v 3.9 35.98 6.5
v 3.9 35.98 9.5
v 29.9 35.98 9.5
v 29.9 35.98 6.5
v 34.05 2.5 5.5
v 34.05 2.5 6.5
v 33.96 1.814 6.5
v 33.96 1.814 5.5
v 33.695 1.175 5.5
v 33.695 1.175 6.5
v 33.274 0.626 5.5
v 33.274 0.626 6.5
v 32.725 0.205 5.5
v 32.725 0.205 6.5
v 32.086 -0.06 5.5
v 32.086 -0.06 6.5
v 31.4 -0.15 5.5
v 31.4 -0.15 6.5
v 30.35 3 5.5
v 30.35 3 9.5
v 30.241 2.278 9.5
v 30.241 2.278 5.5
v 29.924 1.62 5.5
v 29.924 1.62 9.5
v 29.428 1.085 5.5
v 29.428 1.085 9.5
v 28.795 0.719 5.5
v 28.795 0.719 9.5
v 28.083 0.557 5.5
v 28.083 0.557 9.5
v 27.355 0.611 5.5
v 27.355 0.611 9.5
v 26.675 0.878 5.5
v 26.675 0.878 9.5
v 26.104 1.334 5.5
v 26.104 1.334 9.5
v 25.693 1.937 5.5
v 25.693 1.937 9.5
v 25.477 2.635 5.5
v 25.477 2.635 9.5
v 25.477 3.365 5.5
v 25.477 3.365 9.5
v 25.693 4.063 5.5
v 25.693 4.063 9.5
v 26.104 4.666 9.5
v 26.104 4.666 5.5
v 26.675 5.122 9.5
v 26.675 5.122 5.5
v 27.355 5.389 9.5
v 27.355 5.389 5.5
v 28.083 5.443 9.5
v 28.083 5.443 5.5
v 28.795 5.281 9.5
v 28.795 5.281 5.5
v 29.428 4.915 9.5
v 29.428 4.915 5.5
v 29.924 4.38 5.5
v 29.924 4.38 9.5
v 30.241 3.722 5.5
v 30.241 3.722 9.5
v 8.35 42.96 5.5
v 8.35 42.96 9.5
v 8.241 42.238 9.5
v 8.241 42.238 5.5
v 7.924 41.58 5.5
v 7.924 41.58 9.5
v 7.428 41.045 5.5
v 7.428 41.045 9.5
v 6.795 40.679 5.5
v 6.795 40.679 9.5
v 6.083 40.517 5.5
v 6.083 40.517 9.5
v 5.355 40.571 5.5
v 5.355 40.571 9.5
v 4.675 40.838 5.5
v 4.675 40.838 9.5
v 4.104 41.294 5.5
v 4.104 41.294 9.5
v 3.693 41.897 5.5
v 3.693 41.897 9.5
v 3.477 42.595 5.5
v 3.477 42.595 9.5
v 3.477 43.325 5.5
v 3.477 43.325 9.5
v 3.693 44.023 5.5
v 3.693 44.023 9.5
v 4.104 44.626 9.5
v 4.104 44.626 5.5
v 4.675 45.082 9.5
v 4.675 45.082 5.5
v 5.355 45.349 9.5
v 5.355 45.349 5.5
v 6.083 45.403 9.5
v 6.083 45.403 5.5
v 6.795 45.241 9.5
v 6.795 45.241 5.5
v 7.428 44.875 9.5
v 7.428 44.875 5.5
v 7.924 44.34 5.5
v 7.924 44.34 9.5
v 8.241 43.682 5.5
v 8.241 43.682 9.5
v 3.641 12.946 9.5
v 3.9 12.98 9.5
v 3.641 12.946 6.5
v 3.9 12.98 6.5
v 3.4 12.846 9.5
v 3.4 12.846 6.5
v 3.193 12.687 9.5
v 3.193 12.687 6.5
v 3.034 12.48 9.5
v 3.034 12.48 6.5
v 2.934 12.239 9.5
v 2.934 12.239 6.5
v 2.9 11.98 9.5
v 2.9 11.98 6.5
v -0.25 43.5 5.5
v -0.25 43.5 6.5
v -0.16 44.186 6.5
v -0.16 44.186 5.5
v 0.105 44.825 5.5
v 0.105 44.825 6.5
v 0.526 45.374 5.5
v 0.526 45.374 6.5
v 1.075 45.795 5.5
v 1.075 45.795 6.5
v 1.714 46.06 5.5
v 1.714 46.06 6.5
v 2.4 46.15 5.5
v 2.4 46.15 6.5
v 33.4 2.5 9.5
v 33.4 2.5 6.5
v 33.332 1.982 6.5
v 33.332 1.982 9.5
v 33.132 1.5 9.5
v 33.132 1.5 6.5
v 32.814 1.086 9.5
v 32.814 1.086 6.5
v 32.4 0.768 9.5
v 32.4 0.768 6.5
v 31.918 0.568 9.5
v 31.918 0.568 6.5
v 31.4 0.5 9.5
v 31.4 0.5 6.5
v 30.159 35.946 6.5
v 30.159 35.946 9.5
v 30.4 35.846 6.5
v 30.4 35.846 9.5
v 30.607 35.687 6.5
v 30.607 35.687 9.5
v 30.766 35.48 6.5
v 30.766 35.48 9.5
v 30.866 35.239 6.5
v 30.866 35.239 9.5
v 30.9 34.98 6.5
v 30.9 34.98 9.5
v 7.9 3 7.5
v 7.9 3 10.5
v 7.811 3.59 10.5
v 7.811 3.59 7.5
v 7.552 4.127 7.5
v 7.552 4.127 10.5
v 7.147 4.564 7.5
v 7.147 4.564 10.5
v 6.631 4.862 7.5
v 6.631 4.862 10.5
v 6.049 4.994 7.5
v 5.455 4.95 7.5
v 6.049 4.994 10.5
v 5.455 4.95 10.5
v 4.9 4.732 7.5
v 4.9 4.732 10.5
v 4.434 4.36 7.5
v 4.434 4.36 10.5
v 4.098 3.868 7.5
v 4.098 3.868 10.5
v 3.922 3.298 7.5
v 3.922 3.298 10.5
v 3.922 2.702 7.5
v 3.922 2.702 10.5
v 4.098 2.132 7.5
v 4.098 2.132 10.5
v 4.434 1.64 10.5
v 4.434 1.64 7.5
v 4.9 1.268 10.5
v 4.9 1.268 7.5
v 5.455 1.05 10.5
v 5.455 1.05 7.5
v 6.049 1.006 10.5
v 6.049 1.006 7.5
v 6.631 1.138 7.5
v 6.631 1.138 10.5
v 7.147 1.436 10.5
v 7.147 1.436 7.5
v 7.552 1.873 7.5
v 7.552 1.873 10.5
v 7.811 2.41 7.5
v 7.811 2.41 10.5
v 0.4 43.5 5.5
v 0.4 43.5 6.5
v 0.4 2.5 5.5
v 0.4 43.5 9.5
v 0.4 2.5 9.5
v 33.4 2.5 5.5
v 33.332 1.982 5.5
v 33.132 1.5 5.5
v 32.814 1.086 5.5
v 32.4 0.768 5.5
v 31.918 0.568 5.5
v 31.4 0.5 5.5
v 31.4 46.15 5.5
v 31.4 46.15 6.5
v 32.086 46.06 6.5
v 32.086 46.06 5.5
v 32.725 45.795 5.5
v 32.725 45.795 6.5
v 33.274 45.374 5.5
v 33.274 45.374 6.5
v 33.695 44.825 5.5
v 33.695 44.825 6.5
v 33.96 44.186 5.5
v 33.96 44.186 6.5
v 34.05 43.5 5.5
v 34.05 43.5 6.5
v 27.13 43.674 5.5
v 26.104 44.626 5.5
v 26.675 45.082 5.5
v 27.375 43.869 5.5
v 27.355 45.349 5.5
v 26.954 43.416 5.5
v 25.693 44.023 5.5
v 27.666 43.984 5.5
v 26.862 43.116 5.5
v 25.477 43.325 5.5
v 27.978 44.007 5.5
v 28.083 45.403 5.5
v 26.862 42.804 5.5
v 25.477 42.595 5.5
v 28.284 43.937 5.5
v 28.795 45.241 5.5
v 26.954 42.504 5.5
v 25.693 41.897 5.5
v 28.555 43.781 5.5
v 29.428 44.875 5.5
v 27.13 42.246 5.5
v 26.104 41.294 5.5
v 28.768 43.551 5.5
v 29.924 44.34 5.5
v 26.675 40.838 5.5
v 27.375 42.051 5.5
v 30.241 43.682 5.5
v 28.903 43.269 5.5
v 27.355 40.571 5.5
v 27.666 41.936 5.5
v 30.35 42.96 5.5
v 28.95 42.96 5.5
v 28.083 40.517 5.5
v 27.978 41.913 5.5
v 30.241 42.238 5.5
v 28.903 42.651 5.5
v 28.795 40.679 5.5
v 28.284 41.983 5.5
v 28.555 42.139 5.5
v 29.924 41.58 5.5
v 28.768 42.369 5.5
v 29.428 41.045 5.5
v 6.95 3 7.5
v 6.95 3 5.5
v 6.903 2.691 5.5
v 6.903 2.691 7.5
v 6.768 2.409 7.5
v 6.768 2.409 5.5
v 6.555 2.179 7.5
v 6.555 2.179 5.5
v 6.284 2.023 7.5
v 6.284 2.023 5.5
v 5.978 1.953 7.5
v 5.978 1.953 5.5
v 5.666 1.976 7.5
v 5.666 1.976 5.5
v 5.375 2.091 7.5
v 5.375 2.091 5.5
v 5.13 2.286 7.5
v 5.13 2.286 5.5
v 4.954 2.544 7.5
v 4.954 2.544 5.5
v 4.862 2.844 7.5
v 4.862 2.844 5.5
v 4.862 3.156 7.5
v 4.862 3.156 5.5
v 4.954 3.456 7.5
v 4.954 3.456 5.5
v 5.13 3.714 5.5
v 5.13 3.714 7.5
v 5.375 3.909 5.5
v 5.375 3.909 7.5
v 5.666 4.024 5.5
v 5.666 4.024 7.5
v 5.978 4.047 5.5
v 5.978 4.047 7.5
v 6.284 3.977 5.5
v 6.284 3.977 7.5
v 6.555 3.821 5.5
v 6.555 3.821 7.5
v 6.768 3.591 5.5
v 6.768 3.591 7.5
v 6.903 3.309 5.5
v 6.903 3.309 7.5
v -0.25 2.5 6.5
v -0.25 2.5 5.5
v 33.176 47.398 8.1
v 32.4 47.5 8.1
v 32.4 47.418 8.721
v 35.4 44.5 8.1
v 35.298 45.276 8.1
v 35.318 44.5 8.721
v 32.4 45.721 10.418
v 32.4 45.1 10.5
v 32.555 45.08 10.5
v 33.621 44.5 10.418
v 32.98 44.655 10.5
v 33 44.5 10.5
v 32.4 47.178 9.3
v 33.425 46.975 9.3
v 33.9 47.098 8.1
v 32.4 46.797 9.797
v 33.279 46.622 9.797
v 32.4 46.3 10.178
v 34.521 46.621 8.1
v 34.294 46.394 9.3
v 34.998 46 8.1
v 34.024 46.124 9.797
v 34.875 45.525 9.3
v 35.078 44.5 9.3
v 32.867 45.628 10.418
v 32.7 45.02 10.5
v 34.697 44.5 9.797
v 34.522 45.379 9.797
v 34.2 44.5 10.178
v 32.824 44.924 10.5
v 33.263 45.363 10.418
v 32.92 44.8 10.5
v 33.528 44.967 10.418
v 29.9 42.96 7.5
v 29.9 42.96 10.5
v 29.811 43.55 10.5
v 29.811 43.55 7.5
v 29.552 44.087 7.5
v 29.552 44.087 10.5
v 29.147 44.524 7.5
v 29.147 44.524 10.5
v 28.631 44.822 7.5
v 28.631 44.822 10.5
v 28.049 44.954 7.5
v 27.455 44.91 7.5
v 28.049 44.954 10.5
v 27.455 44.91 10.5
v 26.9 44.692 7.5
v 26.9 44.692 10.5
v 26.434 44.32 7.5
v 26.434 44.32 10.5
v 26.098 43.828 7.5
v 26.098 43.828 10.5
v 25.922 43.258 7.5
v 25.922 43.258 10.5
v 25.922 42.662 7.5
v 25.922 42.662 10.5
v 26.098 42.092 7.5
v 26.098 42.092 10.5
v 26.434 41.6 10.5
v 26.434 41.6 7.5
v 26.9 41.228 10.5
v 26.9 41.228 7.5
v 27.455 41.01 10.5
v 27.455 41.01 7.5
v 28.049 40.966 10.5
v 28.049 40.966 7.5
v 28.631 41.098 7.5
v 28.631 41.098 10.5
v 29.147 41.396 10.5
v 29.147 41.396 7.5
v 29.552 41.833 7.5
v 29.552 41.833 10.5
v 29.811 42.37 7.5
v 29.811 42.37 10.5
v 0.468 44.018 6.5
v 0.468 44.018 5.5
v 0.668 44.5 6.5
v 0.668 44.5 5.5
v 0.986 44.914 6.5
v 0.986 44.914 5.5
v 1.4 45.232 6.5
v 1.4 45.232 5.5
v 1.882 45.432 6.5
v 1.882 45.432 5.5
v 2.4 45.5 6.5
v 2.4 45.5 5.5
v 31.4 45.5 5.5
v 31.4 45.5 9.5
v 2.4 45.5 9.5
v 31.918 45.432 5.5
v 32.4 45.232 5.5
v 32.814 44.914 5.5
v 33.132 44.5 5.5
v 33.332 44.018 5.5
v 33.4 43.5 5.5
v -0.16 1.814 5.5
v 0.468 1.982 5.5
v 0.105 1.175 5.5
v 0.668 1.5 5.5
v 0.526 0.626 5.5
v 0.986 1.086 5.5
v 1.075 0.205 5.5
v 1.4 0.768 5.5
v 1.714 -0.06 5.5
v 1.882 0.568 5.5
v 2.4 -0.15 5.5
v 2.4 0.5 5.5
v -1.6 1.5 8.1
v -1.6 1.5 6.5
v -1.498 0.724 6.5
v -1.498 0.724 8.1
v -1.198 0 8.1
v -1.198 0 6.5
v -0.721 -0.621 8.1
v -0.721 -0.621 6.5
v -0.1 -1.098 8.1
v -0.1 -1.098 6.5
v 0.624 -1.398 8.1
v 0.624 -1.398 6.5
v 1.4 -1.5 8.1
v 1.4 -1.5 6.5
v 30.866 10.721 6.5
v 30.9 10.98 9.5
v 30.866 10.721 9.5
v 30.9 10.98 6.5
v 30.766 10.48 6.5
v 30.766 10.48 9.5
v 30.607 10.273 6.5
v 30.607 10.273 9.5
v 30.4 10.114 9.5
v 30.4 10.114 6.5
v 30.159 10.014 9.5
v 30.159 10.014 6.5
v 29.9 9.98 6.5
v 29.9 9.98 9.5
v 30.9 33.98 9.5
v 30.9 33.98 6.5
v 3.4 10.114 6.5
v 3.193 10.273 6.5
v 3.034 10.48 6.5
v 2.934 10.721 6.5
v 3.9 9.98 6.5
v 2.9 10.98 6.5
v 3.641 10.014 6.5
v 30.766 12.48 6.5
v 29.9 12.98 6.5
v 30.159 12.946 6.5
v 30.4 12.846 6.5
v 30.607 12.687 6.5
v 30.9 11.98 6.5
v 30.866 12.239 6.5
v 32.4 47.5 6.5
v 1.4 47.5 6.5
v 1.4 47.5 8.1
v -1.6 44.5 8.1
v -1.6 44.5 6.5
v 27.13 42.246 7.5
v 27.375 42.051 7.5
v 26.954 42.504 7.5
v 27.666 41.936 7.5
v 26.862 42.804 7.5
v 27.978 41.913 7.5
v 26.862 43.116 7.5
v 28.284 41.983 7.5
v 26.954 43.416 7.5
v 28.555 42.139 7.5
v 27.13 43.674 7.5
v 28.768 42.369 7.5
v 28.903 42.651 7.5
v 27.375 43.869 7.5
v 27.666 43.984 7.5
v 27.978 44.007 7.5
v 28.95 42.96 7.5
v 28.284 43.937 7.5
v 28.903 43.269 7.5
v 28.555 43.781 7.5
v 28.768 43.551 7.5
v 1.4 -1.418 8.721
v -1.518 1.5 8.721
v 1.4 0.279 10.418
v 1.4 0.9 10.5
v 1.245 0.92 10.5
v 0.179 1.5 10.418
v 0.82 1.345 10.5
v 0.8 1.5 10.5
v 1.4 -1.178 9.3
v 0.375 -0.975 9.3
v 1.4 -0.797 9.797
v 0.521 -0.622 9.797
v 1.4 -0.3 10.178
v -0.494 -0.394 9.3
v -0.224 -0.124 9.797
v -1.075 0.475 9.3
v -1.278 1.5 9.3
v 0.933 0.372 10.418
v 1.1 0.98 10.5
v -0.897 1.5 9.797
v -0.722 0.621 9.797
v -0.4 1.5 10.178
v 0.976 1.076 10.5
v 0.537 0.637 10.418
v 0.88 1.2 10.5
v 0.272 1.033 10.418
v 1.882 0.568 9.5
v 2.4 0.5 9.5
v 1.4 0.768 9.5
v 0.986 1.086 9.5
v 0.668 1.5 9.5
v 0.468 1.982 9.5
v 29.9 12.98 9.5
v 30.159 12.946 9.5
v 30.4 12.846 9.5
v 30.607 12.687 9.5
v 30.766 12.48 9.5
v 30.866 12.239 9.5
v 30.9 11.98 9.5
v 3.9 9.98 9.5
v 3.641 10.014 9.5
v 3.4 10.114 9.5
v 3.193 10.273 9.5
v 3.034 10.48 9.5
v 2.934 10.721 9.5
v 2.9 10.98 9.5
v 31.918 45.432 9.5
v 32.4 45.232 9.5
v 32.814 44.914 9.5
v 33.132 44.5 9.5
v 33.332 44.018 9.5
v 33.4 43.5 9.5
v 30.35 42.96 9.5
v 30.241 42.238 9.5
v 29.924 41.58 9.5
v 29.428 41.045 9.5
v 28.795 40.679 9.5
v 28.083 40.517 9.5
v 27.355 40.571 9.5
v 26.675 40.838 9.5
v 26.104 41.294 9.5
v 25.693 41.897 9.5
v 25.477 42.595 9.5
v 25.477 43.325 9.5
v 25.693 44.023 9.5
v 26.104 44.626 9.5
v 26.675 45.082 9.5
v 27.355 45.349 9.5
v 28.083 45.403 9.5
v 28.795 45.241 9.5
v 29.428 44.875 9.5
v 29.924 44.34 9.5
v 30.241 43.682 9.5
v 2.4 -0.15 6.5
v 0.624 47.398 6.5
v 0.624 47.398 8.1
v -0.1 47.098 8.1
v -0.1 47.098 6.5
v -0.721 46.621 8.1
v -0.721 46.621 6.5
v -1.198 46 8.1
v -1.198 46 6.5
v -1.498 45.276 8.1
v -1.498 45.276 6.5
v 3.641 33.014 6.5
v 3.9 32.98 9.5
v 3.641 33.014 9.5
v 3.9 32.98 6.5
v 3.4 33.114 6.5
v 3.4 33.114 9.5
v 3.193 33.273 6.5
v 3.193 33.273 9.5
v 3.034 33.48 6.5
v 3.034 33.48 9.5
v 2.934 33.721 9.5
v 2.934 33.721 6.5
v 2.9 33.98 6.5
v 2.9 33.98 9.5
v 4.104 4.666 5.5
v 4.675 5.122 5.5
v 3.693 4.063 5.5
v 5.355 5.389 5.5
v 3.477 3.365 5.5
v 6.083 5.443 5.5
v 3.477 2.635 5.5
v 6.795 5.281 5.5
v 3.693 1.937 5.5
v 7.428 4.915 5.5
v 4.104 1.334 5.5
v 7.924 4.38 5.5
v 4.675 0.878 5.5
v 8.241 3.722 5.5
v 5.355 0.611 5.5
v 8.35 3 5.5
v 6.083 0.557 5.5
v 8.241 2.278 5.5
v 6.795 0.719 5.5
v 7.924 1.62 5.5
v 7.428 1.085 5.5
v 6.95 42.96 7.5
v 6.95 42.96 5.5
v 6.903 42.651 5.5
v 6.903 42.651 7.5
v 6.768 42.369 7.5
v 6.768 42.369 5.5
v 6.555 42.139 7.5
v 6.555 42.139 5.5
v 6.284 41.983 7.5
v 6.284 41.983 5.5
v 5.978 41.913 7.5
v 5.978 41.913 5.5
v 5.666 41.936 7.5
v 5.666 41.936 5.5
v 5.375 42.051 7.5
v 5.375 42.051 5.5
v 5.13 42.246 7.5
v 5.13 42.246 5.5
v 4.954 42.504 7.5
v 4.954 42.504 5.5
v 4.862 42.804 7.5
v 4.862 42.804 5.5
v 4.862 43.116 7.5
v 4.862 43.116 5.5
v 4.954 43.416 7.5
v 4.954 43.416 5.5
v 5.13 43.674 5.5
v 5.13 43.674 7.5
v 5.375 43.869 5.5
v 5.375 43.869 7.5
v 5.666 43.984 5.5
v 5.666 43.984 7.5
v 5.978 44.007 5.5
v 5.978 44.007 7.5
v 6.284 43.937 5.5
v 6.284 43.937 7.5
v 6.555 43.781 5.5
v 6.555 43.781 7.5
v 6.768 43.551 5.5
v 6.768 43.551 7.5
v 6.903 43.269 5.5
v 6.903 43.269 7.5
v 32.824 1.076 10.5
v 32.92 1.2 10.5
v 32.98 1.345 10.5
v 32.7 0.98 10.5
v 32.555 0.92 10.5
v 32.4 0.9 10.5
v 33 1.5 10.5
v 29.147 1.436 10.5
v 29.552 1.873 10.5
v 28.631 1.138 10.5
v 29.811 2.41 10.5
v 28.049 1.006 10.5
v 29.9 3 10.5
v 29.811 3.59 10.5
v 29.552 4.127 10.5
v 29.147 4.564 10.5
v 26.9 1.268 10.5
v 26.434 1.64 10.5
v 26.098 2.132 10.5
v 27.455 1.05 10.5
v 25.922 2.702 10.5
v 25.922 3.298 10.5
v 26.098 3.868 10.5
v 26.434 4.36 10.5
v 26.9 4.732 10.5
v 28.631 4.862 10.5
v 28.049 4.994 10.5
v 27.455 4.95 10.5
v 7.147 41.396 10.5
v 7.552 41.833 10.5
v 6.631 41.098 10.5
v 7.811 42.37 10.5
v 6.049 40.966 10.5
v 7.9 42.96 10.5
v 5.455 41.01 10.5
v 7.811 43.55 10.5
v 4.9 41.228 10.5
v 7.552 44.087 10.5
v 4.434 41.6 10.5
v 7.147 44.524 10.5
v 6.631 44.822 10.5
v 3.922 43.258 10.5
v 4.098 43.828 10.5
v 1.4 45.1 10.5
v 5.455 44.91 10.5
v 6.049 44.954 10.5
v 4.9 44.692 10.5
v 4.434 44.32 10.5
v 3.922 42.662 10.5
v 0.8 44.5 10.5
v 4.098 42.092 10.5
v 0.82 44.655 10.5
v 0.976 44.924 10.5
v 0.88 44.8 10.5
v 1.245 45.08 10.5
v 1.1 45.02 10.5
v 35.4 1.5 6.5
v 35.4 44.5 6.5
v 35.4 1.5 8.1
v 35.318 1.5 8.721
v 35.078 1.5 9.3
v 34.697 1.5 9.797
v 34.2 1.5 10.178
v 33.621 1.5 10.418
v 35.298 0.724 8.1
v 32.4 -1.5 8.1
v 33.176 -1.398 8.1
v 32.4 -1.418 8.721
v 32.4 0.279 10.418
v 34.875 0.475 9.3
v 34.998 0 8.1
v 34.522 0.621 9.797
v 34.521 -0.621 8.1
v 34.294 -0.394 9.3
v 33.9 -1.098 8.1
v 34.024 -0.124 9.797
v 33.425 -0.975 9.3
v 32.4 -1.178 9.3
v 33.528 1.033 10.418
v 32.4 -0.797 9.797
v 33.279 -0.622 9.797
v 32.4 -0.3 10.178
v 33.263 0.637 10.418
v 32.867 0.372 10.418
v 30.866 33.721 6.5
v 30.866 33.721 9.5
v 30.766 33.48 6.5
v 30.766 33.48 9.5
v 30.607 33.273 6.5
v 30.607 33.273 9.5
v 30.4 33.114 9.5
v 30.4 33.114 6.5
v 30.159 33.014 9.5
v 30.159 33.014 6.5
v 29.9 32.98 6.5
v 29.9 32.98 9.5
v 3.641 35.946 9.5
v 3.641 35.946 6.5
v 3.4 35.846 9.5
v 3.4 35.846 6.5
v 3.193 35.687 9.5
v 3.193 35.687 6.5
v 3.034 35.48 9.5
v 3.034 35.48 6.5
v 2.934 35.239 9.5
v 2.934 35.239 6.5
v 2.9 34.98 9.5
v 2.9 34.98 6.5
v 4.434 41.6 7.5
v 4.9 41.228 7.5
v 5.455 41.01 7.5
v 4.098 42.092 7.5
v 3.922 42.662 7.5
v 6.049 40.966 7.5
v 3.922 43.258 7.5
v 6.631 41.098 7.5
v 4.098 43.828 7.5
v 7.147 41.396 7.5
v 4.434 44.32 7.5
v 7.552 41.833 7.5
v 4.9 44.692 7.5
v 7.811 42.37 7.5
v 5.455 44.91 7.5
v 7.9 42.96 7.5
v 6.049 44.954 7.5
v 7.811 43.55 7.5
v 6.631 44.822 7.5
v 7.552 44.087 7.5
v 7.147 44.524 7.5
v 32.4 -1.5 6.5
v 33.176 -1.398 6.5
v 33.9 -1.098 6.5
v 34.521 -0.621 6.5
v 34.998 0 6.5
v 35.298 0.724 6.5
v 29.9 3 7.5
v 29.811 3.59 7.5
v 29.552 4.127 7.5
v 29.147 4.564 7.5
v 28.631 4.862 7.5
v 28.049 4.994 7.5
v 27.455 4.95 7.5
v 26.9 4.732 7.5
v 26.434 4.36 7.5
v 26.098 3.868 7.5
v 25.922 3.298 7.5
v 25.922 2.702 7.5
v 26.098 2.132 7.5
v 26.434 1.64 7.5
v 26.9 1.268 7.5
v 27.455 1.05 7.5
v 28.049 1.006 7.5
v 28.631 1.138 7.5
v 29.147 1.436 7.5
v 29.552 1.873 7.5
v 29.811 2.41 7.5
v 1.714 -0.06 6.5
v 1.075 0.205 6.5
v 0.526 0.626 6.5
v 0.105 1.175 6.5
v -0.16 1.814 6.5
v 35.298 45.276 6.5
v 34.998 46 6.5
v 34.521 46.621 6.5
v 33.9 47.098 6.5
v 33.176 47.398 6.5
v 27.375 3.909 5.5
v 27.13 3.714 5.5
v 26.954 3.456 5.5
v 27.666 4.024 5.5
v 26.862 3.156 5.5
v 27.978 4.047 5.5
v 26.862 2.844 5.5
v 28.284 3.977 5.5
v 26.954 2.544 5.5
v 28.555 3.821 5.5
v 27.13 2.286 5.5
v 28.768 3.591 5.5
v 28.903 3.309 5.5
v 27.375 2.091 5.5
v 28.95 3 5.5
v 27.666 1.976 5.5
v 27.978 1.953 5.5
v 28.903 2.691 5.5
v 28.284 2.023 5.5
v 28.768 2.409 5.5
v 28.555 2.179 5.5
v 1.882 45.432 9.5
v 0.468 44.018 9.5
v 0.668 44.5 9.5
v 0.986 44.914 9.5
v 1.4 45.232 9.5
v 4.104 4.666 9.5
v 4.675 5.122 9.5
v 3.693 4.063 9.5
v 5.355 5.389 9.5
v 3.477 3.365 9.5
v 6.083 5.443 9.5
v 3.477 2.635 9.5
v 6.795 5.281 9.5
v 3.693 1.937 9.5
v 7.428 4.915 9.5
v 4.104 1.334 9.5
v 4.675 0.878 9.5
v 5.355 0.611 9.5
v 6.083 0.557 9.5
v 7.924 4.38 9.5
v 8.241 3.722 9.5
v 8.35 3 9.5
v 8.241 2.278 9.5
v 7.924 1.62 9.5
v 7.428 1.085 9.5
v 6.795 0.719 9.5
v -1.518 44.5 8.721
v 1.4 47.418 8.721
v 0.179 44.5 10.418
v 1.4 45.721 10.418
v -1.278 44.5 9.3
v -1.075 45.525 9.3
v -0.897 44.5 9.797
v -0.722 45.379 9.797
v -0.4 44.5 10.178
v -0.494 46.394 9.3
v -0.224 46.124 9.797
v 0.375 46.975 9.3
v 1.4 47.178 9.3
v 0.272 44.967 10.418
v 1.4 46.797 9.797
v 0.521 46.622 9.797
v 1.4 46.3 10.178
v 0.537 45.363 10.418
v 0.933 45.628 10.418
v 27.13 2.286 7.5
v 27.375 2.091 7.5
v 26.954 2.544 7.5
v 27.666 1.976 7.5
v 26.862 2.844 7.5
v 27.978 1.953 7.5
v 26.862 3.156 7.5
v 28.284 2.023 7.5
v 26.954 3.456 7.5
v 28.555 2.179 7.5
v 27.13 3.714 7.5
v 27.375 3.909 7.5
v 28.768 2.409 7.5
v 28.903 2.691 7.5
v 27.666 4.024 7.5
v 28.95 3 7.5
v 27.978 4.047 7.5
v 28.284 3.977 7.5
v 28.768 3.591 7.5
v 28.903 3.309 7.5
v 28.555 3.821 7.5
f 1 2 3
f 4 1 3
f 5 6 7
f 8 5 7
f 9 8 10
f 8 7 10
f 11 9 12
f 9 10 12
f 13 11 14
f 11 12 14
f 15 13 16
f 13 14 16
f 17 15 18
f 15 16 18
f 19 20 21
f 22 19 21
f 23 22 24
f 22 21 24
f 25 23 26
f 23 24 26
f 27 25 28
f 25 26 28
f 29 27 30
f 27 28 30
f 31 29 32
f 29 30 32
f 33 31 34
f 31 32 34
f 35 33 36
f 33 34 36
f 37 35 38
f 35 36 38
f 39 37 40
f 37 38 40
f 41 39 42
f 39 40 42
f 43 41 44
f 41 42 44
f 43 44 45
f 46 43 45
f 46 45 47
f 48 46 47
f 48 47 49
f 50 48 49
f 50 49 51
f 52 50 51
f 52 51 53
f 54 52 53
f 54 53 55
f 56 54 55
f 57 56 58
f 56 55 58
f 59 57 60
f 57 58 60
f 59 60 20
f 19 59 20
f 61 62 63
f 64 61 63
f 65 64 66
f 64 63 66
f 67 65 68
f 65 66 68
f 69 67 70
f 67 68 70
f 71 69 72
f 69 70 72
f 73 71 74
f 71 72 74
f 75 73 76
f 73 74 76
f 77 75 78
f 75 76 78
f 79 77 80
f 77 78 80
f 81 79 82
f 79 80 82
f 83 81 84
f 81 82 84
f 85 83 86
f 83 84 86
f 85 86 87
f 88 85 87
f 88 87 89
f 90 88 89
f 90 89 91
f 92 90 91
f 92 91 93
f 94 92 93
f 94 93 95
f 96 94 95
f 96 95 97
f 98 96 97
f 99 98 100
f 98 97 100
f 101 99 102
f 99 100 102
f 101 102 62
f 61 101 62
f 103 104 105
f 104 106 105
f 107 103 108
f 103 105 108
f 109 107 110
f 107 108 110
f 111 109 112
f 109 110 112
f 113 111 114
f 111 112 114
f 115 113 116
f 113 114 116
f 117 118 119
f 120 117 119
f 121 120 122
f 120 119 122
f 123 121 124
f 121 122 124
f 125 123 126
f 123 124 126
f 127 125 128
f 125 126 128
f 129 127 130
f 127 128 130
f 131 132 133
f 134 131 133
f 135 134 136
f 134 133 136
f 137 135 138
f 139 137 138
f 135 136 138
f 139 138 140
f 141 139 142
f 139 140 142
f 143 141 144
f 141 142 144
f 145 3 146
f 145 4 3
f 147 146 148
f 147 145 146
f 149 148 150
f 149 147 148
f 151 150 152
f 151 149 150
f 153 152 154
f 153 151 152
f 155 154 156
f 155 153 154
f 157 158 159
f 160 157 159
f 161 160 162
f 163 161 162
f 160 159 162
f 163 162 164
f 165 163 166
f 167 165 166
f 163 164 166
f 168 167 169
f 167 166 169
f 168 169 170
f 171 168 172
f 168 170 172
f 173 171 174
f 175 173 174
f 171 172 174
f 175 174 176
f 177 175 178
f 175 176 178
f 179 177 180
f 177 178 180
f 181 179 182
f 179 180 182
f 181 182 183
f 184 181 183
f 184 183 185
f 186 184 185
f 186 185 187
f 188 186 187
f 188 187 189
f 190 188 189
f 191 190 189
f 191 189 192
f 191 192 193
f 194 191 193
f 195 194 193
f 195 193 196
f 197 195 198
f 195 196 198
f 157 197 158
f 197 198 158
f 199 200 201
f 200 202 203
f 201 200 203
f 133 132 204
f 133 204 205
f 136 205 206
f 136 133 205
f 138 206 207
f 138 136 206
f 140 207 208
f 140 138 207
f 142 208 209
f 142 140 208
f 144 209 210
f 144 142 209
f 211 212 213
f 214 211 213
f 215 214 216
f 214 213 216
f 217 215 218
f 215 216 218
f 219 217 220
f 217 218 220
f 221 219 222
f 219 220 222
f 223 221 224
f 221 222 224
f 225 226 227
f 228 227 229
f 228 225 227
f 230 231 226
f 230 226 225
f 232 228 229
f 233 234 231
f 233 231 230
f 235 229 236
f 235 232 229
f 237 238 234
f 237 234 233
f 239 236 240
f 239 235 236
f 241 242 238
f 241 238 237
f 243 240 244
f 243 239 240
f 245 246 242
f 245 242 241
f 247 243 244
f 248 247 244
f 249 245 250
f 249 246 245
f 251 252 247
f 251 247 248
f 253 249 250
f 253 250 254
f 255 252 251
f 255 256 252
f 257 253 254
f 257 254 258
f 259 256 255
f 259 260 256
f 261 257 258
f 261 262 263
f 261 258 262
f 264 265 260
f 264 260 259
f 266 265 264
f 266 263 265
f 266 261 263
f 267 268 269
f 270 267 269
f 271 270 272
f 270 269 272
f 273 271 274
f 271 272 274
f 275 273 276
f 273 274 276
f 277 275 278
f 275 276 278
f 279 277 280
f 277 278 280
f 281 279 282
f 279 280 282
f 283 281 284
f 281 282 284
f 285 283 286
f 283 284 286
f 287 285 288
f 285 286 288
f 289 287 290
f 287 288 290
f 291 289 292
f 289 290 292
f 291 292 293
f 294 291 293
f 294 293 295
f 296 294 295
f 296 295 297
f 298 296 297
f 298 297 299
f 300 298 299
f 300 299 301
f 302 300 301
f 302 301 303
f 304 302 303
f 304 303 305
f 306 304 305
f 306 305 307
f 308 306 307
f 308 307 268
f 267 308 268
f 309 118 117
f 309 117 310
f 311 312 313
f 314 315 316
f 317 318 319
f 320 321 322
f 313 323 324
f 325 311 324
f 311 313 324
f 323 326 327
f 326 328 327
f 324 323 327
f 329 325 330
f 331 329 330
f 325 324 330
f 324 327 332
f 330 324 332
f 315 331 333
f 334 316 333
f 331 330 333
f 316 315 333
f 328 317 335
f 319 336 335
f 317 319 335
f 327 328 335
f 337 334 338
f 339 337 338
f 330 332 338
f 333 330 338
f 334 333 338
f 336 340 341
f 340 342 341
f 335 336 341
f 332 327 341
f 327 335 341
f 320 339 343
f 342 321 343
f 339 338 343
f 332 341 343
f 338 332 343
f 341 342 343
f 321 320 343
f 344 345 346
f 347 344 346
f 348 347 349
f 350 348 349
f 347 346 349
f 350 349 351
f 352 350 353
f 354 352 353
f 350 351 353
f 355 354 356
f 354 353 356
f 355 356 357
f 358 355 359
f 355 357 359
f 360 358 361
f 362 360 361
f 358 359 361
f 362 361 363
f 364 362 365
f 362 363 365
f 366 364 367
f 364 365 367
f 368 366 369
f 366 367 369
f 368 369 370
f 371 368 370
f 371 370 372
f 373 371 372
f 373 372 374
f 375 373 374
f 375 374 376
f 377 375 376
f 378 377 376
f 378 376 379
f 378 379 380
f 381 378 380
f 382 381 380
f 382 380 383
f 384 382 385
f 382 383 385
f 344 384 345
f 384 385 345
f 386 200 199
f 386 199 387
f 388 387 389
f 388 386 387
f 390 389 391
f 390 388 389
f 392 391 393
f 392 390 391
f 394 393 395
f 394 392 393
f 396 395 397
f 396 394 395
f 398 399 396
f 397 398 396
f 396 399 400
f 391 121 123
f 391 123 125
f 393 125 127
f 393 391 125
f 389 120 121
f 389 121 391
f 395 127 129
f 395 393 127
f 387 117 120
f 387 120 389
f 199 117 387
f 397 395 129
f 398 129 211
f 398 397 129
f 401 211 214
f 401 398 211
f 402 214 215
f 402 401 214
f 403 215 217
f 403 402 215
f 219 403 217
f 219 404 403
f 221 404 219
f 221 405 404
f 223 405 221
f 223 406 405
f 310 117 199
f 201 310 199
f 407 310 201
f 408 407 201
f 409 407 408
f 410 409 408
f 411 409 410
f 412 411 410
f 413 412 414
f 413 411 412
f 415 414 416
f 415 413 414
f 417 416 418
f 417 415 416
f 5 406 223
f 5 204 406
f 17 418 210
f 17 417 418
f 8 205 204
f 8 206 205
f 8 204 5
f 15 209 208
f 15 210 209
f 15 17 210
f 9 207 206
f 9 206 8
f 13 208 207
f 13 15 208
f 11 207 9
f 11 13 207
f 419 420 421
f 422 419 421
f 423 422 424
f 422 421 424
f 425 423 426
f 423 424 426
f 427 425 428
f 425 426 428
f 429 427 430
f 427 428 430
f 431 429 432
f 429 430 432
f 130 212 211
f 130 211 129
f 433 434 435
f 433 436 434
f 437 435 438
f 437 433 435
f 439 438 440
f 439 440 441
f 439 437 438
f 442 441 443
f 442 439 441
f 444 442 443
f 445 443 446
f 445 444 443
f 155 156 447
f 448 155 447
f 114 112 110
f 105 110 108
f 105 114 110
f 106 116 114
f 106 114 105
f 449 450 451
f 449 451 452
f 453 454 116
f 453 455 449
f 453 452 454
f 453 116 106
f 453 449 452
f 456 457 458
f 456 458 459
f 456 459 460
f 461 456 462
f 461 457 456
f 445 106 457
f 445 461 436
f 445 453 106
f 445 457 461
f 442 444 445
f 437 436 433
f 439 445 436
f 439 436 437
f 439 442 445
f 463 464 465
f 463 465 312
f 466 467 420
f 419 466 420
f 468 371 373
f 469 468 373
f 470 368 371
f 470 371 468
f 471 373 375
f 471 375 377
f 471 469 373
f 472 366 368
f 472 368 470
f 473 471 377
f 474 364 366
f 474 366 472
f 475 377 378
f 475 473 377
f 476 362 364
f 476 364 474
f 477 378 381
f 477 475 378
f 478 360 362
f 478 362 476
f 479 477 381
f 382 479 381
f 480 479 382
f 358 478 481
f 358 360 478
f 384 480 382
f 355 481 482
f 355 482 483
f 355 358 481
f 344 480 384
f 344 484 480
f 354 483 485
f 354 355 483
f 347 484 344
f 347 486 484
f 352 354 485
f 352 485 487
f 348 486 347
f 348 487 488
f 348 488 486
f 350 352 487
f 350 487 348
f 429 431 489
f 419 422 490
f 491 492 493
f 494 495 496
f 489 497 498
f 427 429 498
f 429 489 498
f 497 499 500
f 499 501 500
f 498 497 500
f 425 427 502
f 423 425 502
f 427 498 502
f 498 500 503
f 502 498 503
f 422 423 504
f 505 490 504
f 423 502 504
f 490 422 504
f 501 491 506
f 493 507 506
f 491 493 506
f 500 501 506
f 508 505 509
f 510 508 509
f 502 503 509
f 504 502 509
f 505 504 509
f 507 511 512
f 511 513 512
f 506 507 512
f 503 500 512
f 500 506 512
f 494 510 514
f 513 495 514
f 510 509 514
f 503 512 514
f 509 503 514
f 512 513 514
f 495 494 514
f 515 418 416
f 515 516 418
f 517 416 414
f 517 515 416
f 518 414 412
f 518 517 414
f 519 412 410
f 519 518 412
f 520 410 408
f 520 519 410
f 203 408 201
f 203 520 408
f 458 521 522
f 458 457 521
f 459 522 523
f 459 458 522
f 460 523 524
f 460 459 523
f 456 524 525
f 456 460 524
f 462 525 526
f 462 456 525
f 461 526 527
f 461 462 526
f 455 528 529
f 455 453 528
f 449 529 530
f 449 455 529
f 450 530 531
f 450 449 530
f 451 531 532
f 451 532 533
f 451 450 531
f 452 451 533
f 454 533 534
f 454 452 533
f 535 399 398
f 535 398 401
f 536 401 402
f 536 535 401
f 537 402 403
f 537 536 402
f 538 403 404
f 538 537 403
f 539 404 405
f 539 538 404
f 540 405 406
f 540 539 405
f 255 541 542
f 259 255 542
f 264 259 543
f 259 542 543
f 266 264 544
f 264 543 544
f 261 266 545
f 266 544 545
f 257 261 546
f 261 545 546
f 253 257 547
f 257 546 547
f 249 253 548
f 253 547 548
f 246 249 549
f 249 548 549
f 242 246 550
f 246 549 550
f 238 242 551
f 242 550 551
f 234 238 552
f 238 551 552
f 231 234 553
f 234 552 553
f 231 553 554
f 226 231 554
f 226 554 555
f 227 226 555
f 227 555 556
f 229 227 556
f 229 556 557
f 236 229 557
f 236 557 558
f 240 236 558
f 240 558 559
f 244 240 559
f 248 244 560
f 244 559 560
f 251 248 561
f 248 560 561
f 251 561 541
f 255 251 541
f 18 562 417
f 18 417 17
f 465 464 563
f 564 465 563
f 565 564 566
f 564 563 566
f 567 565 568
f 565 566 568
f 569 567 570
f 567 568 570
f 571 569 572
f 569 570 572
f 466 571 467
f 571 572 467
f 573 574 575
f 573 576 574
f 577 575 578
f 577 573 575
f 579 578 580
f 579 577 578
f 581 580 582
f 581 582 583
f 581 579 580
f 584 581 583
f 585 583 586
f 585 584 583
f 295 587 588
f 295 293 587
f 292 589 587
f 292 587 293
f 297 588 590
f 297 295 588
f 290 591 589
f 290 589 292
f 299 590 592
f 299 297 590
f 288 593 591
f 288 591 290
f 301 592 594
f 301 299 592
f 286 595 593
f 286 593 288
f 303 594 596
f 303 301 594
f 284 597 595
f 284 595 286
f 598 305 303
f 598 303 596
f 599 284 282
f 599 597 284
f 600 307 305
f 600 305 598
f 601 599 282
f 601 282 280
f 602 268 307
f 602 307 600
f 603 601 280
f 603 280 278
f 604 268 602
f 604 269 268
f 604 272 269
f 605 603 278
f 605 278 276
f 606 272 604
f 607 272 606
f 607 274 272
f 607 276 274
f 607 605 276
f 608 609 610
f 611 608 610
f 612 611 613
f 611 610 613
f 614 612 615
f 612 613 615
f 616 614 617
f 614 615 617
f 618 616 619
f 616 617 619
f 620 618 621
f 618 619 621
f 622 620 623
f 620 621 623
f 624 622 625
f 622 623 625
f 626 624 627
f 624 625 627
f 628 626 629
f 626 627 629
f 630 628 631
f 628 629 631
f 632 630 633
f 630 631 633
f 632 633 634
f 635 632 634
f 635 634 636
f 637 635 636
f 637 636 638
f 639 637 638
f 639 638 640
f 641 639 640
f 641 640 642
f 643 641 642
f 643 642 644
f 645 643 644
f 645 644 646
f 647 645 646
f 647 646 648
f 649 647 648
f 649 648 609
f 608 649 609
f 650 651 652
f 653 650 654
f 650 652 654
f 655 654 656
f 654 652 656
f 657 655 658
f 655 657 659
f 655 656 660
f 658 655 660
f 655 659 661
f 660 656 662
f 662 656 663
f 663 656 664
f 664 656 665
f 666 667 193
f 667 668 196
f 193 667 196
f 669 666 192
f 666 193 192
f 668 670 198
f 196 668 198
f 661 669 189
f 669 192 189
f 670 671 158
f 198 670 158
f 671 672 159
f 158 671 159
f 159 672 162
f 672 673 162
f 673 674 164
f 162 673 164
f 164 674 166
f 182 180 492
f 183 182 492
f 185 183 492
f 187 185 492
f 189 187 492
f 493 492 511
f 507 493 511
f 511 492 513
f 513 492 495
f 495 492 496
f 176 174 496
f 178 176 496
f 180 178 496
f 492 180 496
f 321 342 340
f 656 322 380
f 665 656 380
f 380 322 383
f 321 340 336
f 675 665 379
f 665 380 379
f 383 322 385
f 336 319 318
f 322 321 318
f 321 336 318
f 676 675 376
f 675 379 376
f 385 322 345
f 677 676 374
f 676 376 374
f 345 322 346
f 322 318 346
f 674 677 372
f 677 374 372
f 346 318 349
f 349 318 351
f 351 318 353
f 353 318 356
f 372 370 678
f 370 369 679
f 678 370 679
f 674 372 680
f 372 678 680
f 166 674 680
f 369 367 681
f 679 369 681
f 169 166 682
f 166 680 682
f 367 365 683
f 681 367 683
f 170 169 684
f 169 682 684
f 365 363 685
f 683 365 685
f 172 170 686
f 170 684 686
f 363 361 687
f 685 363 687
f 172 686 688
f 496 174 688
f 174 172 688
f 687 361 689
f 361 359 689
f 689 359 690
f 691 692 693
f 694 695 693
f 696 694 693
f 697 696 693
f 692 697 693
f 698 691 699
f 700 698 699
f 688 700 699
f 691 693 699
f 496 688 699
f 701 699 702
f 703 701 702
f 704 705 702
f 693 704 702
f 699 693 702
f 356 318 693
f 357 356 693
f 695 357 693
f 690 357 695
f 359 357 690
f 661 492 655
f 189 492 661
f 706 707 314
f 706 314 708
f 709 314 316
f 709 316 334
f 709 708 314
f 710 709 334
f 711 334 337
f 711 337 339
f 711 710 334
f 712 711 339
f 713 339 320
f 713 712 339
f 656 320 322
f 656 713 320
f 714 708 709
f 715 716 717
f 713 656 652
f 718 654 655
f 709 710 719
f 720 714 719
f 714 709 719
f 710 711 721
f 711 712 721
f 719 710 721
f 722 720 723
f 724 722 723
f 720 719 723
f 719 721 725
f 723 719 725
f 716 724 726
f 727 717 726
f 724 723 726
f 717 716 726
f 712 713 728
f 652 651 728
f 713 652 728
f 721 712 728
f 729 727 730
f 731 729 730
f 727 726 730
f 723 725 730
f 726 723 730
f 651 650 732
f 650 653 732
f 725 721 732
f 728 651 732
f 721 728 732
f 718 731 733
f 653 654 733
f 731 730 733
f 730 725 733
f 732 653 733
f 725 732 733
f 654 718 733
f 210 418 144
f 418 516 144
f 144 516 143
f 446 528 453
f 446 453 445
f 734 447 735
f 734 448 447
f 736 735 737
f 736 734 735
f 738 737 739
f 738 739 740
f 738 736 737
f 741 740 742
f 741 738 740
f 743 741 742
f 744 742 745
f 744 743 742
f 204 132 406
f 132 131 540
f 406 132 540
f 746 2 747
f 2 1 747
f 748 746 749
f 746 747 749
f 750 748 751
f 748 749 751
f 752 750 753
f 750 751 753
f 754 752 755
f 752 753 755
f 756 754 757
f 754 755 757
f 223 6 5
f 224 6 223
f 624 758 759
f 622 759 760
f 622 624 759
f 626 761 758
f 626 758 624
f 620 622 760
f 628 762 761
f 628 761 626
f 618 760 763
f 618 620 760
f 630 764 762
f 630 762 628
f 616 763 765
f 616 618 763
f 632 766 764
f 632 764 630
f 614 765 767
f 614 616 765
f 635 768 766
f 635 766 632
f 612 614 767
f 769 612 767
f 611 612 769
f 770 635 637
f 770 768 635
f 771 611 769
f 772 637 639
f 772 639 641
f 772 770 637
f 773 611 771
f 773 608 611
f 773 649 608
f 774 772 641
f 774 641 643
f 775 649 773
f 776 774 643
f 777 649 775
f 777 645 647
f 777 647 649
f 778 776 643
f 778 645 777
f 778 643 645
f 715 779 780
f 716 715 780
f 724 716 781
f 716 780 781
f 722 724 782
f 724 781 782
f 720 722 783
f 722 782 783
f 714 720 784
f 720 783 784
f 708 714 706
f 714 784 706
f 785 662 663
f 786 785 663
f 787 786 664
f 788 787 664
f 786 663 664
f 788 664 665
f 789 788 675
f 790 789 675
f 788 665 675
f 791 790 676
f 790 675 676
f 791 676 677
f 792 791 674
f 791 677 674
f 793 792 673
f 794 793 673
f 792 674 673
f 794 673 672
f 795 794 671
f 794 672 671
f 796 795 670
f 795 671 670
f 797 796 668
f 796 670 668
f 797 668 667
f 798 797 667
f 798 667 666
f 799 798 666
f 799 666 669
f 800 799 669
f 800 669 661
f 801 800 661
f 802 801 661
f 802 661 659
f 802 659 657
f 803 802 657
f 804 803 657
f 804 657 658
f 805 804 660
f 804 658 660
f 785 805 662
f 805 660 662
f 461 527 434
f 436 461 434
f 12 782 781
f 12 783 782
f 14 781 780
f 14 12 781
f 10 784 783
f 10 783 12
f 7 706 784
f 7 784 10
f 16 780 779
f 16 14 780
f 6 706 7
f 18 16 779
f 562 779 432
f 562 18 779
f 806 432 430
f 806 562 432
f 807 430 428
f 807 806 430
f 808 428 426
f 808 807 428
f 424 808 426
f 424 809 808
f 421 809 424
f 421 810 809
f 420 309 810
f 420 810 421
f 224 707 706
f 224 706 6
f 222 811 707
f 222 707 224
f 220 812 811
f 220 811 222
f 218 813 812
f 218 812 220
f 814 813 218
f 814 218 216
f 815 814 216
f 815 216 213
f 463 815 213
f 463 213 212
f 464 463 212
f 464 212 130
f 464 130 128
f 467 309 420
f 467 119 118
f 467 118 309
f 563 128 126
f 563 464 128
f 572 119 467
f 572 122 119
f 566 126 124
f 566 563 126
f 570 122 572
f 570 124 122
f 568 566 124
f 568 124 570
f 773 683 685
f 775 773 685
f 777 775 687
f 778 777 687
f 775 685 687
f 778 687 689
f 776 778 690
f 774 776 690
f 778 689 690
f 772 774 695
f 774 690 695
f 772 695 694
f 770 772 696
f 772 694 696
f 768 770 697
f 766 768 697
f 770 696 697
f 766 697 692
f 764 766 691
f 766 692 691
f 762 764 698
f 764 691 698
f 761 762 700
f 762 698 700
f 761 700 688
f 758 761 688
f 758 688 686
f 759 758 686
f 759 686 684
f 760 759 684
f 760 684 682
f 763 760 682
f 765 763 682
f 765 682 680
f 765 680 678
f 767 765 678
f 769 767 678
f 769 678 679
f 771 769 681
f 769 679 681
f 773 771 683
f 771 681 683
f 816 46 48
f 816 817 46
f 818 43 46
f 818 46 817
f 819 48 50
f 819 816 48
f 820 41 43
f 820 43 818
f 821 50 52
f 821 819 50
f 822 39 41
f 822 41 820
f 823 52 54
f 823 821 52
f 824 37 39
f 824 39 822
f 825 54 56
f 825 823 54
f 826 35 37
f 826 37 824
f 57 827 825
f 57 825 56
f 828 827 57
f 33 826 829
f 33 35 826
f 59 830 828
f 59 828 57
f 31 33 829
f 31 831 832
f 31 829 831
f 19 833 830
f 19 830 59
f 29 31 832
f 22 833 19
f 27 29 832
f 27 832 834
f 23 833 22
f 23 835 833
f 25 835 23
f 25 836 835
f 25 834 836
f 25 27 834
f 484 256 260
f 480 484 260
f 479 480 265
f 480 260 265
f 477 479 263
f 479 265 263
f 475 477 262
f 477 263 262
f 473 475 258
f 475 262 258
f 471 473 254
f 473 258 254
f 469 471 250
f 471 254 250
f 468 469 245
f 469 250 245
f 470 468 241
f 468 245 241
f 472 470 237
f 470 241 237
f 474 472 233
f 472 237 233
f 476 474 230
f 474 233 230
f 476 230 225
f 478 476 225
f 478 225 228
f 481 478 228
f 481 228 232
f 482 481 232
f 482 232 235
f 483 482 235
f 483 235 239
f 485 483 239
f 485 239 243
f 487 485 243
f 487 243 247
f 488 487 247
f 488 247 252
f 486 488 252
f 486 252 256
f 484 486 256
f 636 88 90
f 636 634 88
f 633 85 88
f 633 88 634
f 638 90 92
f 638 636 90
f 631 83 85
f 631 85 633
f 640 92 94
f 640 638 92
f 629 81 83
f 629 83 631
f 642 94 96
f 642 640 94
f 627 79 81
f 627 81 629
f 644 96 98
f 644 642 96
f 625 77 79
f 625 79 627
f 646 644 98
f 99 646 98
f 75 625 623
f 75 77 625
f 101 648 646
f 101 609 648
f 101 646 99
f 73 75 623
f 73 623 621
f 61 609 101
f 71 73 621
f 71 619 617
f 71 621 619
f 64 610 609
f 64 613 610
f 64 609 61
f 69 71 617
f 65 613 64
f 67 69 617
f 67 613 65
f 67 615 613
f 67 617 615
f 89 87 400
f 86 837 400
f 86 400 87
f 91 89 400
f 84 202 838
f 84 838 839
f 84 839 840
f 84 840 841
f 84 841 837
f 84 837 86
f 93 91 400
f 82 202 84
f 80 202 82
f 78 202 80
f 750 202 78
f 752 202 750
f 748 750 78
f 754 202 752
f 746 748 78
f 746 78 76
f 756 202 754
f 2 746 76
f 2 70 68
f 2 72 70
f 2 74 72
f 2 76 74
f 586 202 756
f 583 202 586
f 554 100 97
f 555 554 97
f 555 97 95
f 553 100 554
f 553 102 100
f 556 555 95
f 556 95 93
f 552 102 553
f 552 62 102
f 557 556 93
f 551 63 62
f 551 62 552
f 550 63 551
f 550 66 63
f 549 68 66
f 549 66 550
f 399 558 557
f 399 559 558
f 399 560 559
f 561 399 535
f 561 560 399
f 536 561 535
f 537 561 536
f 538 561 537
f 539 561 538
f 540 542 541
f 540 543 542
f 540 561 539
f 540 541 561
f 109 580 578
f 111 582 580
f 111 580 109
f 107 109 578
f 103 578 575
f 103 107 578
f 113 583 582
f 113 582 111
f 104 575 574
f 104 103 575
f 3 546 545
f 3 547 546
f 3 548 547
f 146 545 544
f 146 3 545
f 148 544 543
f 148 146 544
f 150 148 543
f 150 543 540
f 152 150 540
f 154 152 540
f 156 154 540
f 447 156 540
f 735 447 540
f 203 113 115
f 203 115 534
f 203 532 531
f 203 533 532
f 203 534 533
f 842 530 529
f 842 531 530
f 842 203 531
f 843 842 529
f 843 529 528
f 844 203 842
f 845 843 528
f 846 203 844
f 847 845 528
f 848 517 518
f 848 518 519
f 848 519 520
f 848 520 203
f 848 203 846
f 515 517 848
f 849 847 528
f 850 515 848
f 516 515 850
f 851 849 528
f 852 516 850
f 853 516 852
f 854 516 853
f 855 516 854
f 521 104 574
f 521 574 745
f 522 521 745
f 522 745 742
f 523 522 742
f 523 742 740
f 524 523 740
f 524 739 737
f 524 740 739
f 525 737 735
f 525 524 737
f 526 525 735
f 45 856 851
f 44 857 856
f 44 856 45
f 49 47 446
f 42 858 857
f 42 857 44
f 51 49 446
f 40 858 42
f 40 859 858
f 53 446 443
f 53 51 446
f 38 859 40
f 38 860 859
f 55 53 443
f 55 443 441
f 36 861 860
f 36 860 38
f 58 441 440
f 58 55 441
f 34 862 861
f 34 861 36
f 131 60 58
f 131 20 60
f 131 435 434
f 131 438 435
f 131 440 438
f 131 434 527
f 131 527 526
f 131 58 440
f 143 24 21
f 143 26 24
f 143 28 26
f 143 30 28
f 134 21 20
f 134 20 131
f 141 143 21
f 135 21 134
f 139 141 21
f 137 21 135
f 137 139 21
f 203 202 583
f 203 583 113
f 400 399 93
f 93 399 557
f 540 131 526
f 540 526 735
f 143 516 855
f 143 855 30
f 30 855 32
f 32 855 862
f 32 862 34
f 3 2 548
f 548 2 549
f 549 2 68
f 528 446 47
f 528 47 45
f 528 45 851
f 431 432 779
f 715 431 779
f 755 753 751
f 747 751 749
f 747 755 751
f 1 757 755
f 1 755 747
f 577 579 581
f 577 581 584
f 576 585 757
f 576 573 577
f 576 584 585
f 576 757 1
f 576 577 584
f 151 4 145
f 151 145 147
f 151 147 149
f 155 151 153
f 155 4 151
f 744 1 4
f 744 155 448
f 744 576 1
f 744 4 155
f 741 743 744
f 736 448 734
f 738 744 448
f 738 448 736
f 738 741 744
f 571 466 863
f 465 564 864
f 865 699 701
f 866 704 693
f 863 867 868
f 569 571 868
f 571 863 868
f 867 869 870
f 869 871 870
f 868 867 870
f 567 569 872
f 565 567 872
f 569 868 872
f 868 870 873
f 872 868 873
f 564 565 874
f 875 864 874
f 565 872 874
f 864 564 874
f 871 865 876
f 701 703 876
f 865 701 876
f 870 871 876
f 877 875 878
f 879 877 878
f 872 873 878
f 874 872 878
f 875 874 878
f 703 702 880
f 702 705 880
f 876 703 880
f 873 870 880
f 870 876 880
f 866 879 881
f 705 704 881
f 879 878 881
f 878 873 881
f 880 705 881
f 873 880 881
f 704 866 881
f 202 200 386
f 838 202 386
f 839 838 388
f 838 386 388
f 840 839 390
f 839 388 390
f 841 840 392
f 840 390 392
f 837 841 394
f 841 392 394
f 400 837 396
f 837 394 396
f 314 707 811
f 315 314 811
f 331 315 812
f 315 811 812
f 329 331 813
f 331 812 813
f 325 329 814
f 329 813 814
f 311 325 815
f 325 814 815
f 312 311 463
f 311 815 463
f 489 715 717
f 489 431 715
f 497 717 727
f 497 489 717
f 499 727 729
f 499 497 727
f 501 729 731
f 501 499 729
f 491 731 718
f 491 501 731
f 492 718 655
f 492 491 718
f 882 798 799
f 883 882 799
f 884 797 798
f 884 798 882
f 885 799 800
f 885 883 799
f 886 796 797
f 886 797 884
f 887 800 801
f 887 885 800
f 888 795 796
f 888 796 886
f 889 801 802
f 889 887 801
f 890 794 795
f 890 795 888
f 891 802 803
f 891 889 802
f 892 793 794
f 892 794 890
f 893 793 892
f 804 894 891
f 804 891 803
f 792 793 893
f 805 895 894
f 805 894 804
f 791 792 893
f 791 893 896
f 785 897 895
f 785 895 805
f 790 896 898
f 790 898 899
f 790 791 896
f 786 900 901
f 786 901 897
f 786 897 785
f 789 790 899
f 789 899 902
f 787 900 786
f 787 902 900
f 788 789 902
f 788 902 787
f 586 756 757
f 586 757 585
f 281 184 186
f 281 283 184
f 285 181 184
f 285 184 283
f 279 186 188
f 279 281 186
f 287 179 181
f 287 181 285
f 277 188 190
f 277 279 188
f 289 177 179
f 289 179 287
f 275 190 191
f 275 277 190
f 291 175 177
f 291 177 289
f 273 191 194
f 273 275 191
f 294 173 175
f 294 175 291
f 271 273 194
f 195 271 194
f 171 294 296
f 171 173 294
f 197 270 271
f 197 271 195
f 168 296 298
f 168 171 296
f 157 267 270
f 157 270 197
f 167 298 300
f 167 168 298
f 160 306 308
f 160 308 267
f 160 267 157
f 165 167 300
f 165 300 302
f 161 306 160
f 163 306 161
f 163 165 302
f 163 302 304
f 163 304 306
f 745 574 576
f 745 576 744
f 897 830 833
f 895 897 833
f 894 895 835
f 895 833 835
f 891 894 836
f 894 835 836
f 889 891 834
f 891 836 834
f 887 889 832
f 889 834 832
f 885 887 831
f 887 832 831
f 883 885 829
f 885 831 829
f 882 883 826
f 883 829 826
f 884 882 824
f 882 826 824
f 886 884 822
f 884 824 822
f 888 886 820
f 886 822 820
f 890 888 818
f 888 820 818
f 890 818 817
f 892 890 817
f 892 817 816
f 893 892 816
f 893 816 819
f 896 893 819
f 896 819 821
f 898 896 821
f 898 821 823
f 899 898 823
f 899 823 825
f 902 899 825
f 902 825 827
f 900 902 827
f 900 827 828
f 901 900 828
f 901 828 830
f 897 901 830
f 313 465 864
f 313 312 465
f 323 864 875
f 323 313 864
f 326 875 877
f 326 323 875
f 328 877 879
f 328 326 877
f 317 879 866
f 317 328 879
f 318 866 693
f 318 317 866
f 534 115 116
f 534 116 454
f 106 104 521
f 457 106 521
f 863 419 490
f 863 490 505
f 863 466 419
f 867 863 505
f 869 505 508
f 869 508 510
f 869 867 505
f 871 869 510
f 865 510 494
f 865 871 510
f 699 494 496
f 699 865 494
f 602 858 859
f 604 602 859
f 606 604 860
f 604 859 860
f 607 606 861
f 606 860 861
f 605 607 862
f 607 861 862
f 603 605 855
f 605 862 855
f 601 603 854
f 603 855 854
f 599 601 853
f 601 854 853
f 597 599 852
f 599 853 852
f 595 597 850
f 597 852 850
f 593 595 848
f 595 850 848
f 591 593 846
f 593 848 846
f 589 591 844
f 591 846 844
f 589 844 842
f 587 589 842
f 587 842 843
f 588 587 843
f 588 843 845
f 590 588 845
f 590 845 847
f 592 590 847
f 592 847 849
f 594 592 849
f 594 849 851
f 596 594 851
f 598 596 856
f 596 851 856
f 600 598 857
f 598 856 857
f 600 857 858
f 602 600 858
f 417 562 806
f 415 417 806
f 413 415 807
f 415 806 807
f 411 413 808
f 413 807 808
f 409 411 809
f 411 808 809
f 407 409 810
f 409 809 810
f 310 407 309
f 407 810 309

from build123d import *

# Parameters (mm, degrees)
PAD004_DEPTH    = 4
FILLET004_R     = 2.4
POCKET006_DEPTH = 3
SKETCH017_R     = 2.45
PAD012_DEPTH    = 4
SKETCH018_R     = 1.05
POCKET009_DEPTH = 5.001
SKETCH019_R     = 2
POCKET010_DEPTH = 3
PAD013_DEPTH    = 1
SKETCH022_W     = 28
SKETCH022_H     = 3
PAD014_DEPTH    = 3
FILLET009_R     = 1


with BuildPart() as part:
    # Sketch009 (on DatumPlane) → Pad004 (new body)
    with BuildSketch(Plane.XY.offset(6.5)):
        with BuildLine():
            Line((1.4, 47.5), (32.4, 47.5))
            ThreePointArc((35.4, 44.5), (34.52132, 46.62132), (32.4, 47.5))
            Line((35.4, 44.5), (35.4, 1.5))
            ThreePointArc((32.4, -1.5), (34.52132, -0.62132), (35.4, 1.5))
            Line((1.4, -1.5), (32.4, -1.5))
            ThreePointArc((-1.6, 1.5), (-0.72132, -0.62132), (1.4, -1.5))
            Line((-1.6, 44.5), (-1.6, 1.5))
            ThreePointArc((1.4, 47.5), (-0.72132, 46.62132), (-1.6, 44.5))
        make_face()
    extrude(amount=PAD004_DEPTH)

    # Fillet004
    fillet004_edges = [part.edges().sort_by_distance(p)[0] for p in [
        (16.9, 47.5, 10.5),
    ]]
    fillet(fillet004_edges, radius=FILLET004_R)

    # Sketch010 (on Face4 of Fillet004) → Pocket006 (cut)
    with BuildSketch(Plane(origin=(0, 0, 6.5), x_dir=(1, 0, 0), z_dir=(0, 0, -1))):
        with BuildLine():
            ThreePointArc((2.4, -0.5), (0.985786, -1.085786), (0.4, -2.5))
            Line((0.4, -2.5), (0.4, -43.5))
            ThreePointArc((0.4, -43.5), (0.985792, -44.914219), (2.400016, -45.5))
            Line((31.4, -45.5), (2.400016, -45.5))
            ThreePointArc((31.4, -45.5), (32.814214, -44.914214), (33.4, -43.5))
            Line((33.4, -2.5), (33.4, -43.5))
            ThreePointArc((33.4, -2.5), (32.814214, -1.085786), (31.4, -0.5))
            Line((2.4, -0.5), (31.4, -0.5))
        make_face()
    extrude(amount=-POCKET006_DEPTH, mode=Mode.SUBTRACT)

    # Sketch017 (on Face27 of Pocket006) → Pad012 (join)
    with BuildSketch(Plane(origin=(0, 0, 9.5), x_dir=(1, 0, 0), z_dir=(0, 0, -1))):
        with Locations((5.9, -3)):
            Circle(SKETCH017_R)
        with Locations((27.9, -3)):
            Circle(SKETCH017_R)
        with Locations((5.9, -42.96)):
            Circle(SKETCH017_R)
        with Locations((27.9, -42.96)):
            Circle(SKETCH017_R)
    extrude(amount=PAD012_DEPTH)

    # Sketch018 (on Face34 of Pad012) → Pocket009 (cut, through all)
    with BuildSketch(Plane(origin=(0, 0, 5.5), x_dir=(1, 0, 0), z_dir=(0, 0, -1))):
        with Locations((5.9, -3)):
            Circle(SKETCH018_R)
        with Locations((27.9, -3)):
            Circle(SKETCH018_R)
        with Locations((5.9, -42.96)):
            Circle(SKETCH018_R)
        with Locations((27.9, -42.96)):
            Circle(SKETCH018_R)
    extrude(amount=-POCKET009_DEPTH, mode=Mode.SUBTRACT)

    # Sketch019 (on Face9 of Pocket009) → Pocket010 (cut)
    with BuildSketch(Plane.XY.offset(10.5)):
        with Locations((27.9, 3)):
            Circle(SKETCH019_R)
        with Locations((5.9, 3)):
            Circle(SKETCH019_R)
        with Locations((27.9, 42.96)):
            Circle(SKETCH019_R)
        with Locations((5.9, 42.96)):
            Circle(SKETCH019_R)
    extrude(amount=-POCKET010_DEPTH, mode=Mode.SUBTRACT)

    # Sketch021 (on Face4 of Pocket010) → Pad013 (join)
    with BuildSketch(Plane(origin=(0, 0, 6.5), x_dir=(1, 0, 0), z_dir=(0, 0, -1))):
        with BuildLine():
            ThreePointArc((2.4, 0.15), (0.526163, -0.626172), (-0.25, -2.500013))
            Line((-0.25, -43.5), (-0.25, -2.500013))
            ThreePointArc((-0.25, -43.5), (0.526167, -45.373833), (2.4, -46.15))
            Line((31.4, -46.15), (2.4, -46.15))
            ThreePointArc((31.4, -46.15), (33.273833, -45.373833), (34.05, -43.5))
            Line((34.05, -2.5), (34.05, -43.5))
            ThreePointArc((34.05, -2.5), (33.273833, -0.626167), (31.4, 0.15))
            Line((2.4, 0.15), (31.4, 0.15))
        make_face()
        with BuildLine():
            ThreePointArc((2.4, -0.5), (0.985786, -1.085786), (0.4, -2.5))
            Line((0.4, -43.5), (0.4, -2.5))
            ThreePointArc((0.4, -43.5), (0.985786, -44.914214), (2.4, -45.5))
            Line((31.4, -45.5), (2.4, -45.5))
            ThreePointArc((31.4, -45.5), (32.814214, -44.914214), (33.4, -43.5))
            Line((33.4, -2.5), (33.4, -43.5))
            ThreePointArc((33.4, -2.5), (32.814214, -1.085787), (31.4, -0.5))
            Line((2.4, -0.5), (31.4, -0.5))
        make_face(mode=Mode.SUBTRACT)
    extrude(amount=PAD013_DEPTH)

    # Sketch022 (on Face60 of Pad013) → Pad014 (join)
    with BuildSketch(Plane(origin=(0, 0, 9.5), x_dir=(1, 0, 0), z_dir=(0, 0, -1))):
        with Locations((16.9, -11.48)):
            Rectangle(SKETCH022_W, SKETCH022_H)
        with Locations((16.9, -34.48)):
            Rectangle(SKETCH022_W, SKETCH022_H)
    extrude(amount=PAD014_DEPTH)

    # Fillet009
    fillet009_edges = [part.edges().sort_by_distance(p)[0] for p in [
        (2.9, 12.98, 8),
        (2.9, 9.98, 8),
        (30.9, 9.98, 8),
        (30.9, 12.98, 8),
        (30.9, 32.98, 8),
        (30.9, 35.98, 8),
        (2.9, 35.98, 8),
        (2.9, 32.98, 8),
    ]]
    fillet(fillet009_edges, radius=FILLET009_R)


solid = part.part
